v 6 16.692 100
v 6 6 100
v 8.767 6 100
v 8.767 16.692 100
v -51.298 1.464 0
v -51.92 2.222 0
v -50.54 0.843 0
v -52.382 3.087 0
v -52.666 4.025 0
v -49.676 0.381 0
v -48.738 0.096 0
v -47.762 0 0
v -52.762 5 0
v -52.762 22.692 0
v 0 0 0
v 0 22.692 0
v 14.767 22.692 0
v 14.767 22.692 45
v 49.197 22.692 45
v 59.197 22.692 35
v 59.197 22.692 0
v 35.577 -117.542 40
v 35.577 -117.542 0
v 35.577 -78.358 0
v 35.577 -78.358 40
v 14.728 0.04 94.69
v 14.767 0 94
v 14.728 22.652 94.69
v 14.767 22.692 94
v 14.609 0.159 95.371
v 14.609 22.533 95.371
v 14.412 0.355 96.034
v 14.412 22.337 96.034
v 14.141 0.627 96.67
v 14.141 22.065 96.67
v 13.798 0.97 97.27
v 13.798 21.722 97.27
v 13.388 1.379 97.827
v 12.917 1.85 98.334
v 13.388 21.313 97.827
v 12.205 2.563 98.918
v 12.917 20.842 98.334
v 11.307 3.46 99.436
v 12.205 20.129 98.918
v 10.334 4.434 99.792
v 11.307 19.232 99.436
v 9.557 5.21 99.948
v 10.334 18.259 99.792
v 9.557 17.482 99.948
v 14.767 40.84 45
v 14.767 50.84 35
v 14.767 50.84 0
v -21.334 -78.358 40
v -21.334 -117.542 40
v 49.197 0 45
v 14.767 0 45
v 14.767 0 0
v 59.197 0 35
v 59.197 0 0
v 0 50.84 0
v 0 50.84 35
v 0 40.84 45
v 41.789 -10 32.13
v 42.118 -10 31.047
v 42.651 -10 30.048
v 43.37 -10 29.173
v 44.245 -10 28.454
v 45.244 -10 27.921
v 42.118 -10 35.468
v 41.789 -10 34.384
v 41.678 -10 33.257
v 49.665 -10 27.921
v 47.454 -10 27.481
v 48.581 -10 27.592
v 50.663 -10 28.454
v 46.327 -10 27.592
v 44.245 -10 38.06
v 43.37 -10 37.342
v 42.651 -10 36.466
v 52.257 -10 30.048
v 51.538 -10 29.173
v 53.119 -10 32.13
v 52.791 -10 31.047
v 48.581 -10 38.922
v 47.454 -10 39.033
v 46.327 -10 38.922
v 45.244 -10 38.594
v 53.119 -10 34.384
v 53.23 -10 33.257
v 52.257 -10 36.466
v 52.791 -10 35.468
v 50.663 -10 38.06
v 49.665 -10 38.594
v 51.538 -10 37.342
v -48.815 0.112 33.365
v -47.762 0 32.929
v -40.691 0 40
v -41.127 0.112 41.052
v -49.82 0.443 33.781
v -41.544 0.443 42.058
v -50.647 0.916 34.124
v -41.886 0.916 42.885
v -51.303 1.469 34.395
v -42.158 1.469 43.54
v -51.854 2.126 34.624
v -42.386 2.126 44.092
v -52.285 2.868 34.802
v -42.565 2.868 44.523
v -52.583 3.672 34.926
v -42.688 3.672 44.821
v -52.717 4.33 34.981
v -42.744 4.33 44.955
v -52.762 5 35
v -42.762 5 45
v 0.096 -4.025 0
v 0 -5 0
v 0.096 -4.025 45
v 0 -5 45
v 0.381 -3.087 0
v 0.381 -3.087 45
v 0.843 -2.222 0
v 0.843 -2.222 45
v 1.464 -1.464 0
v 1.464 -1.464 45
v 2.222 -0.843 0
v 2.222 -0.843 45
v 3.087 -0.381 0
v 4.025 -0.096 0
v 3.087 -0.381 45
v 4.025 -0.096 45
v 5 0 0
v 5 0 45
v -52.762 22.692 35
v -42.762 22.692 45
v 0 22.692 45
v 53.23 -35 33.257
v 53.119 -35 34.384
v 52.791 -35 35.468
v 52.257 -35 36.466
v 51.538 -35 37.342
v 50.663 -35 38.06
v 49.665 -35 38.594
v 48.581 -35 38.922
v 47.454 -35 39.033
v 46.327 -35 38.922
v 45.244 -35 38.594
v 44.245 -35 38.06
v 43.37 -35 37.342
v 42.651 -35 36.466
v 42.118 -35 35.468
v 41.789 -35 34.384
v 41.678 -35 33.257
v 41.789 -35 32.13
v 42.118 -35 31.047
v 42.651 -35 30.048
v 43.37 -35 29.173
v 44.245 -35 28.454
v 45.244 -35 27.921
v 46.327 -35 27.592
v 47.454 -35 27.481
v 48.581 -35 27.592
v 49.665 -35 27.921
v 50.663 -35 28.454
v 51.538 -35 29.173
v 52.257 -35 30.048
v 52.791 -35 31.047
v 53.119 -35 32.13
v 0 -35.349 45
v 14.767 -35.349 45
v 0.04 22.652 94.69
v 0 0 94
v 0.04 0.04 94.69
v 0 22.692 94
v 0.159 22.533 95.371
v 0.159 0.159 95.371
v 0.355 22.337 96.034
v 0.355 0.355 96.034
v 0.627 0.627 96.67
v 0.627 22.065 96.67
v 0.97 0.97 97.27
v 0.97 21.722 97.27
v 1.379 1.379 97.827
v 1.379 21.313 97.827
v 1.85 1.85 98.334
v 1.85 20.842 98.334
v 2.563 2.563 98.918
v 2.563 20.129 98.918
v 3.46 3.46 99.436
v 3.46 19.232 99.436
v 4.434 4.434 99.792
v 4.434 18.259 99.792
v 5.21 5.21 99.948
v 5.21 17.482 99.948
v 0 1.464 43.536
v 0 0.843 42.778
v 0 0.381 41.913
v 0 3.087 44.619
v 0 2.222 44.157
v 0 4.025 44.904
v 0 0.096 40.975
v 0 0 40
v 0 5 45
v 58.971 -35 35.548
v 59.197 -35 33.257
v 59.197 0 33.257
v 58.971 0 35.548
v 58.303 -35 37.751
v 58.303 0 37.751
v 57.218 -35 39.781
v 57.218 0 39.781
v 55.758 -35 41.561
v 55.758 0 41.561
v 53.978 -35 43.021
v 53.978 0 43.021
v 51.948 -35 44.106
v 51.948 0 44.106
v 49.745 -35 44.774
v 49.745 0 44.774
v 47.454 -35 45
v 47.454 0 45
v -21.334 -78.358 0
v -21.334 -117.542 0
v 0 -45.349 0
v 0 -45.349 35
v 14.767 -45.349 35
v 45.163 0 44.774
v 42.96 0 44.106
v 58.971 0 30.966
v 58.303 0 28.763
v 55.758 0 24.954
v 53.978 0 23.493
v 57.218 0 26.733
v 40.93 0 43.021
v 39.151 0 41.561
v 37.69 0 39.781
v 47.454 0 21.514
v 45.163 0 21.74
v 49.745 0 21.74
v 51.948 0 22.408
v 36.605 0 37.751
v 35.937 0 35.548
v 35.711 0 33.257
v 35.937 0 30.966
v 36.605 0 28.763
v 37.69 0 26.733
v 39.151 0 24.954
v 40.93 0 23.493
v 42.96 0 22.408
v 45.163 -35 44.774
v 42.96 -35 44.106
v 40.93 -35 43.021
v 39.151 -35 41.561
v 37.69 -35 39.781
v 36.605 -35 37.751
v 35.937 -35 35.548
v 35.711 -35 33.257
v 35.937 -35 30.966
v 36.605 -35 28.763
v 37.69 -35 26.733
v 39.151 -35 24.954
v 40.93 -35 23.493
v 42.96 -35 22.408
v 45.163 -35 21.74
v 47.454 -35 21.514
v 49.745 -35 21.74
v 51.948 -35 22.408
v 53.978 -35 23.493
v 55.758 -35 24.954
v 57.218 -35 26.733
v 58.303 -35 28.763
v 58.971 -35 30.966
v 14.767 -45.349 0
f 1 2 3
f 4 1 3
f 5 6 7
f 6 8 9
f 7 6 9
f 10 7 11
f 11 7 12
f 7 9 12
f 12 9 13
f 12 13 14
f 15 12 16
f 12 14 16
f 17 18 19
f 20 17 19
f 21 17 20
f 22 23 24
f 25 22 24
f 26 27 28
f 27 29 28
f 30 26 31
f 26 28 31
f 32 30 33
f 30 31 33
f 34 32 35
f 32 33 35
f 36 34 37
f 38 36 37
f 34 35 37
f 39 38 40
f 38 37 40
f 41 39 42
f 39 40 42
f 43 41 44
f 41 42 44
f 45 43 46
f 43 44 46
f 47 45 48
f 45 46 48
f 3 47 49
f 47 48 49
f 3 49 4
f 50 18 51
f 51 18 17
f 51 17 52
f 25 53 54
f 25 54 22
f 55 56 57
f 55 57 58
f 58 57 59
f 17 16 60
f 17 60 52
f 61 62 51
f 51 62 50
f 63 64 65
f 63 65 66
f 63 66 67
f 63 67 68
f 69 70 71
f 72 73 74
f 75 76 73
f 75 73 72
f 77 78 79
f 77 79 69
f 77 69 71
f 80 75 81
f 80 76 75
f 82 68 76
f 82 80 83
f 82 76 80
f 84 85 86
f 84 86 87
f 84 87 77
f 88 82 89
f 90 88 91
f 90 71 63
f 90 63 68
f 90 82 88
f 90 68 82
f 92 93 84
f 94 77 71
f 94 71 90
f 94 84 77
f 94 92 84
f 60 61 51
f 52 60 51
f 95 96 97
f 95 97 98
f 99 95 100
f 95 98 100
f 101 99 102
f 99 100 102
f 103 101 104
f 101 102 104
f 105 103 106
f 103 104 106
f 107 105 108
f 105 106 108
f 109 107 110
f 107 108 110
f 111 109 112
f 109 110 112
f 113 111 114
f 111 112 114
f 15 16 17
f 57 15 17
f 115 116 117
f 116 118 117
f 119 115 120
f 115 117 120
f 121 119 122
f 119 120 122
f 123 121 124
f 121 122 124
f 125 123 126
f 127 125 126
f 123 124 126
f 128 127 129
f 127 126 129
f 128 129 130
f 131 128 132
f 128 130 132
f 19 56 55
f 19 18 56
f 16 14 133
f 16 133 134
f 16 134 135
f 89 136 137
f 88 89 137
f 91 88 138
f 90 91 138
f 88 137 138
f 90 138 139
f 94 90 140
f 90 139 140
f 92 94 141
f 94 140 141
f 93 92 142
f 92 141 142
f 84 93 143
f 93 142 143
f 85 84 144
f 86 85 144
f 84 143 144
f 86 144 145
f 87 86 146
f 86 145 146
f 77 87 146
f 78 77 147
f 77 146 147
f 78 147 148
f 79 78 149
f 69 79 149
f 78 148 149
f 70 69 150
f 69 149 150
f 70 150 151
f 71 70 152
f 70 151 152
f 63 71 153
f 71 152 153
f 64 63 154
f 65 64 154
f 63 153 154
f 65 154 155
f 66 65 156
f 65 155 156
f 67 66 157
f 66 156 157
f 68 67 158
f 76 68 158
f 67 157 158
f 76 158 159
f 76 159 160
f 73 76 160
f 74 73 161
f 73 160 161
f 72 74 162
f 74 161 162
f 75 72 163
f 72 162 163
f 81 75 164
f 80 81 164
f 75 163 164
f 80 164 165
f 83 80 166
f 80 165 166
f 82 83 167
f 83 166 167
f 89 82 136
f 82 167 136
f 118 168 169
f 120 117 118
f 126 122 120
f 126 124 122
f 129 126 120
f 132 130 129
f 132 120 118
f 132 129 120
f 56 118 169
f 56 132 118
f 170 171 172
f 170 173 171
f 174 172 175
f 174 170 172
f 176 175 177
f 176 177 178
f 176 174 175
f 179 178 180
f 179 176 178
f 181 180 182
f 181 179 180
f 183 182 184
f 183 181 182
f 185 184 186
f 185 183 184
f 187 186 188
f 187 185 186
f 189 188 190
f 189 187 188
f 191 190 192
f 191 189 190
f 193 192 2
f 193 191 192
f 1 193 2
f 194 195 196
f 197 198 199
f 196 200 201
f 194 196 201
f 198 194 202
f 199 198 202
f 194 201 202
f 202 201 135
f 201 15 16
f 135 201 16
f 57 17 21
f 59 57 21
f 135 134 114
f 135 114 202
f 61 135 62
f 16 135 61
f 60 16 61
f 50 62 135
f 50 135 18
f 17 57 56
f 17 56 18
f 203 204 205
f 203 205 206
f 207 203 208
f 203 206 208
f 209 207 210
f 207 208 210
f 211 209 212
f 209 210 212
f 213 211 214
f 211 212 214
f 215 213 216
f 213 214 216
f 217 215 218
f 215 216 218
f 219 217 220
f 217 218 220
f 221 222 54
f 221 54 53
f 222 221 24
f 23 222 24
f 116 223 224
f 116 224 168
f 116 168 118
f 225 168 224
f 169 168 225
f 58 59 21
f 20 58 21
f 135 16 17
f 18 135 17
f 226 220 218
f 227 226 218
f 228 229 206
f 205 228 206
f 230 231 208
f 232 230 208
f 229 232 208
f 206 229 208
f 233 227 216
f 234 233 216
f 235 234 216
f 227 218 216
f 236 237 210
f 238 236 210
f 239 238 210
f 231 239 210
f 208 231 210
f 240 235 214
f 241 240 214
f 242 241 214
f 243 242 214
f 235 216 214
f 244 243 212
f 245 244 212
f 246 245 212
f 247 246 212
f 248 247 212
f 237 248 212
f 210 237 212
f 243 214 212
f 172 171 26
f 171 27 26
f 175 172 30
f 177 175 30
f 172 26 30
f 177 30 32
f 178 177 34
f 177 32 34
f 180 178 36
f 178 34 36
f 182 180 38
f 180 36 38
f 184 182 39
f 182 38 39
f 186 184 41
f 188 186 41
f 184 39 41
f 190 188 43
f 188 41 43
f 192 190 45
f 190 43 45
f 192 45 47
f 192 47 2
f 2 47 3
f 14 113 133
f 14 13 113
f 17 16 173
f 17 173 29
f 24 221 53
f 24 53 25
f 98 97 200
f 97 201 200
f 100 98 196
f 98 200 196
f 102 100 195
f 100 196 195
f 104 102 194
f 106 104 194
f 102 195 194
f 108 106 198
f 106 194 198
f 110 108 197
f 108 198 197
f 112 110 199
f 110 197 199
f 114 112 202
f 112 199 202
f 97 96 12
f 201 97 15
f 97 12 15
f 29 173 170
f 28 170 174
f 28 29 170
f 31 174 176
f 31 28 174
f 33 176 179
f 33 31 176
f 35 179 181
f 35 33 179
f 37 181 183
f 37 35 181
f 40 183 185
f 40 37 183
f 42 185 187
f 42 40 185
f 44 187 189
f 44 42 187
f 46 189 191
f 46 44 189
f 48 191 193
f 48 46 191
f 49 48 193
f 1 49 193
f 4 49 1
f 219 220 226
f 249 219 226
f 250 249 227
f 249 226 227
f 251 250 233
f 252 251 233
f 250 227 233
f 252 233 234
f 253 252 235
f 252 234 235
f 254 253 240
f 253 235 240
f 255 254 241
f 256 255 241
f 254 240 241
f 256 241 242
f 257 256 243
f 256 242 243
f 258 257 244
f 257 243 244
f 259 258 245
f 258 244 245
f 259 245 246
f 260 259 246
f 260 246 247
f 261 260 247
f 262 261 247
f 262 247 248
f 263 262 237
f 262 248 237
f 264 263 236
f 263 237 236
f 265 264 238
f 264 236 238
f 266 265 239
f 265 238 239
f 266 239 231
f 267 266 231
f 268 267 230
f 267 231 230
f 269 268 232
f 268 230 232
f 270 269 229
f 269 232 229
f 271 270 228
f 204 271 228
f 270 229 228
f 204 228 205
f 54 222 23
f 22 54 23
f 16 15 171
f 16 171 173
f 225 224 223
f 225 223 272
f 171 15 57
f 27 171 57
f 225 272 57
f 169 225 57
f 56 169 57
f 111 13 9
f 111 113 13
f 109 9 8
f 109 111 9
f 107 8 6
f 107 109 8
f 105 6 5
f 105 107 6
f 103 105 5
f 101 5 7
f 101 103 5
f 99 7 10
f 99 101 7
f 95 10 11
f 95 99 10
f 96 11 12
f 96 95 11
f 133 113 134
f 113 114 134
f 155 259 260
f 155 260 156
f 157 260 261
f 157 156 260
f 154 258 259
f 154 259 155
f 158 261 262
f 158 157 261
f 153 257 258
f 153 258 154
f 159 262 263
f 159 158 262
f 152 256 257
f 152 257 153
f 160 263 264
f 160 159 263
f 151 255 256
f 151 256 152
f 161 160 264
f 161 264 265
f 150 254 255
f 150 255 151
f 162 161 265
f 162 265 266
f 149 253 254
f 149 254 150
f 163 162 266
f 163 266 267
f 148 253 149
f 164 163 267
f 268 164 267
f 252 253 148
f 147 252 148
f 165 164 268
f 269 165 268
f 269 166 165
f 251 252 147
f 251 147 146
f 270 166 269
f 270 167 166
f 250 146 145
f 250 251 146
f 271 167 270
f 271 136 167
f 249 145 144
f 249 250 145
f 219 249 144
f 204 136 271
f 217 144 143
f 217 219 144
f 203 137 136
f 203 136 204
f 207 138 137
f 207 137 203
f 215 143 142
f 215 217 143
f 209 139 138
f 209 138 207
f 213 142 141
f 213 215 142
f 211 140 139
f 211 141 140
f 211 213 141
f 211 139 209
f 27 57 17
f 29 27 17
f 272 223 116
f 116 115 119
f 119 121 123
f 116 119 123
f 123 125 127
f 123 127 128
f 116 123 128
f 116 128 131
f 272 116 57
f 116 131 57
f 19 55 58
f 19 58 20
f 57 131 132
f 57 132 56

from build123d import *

# Parameters (mm, degrees)
F0_W      = 52.7622997761
F0_H      = 22.692091763
F10_DEPTH = 45
F0_W_2    = 14.7673599422
F0_H_2    = 45.3494936228
F0_W_3    = 44.4295331836
F0_H_3    = 28.1479656696
F2_DEPTH  = 35
F3_SIZE   = 10
F3_2_SIZE = 10
F3_3_SIZE = 10
F3_4_SIZE = 10
F4_W      = 14.7673599422
F4_H      = 22.692091763
F5_DEPTH  = 100
F11_R     = 6
F6_R      = 5.776153979
F7_DEPTH  = 25
F12_R     = 5
F13_R     = 5
F8_W      = 56.9116361439
F8_H      = 39.1838252544
F9_DEPTH  = 40


with BuildPart() as f10:
    # F0 (on Top) → F10 (new body)
    with BuildSketch(Plane.XY):
        with Locations((-26.381149888, 11.3460458815)):
            Rectangle(F0_W, F0_H)
    extrude(amount=F10_DEPTH)

    # F3#4
    f3_4_edges = [f10.edges().sort_by_distance(p)[0] for p in [
        (-52.7623, 11.346046, 45),
    ]]
    chamfer(f3_4_edges, length=F3_4_SIZE)

    # F13
    f13_edges = [f10.edges().sort_by_distance(p)[0] for p in [
        (-47.7623, 0, 40),
        (-21.38115, 0, 45),
        (-52.7623, 0, 17.5),
    ]]
    fillet(f13_edges, radius=F13_R)


with BuildPart() as f10b:
    # F0 (on Top) → F10, piece 2 (new body)
    with BuildSketch(Plane.XY):
        with Locations((7.3836799711, -22.6747468114)):
            Rectangle(F0_W_2, F0_H_2)
    extrude(amount=F10_DEPTH)

    # F3
    f3_edges = [f10b.edges().sort_by_distance(p)[0] for p in [
        (7.38368, -45.349494, 45),
    ]]
    chamfer(f3_edges, length=F3_SIZE)

    # F12
    f12_edges = [f10b.edges().sort_by_distance(p)[0] for p in [
        (0, 0, 22.5),
    ]]
    fillet(f12_edges, radius=F12_R)


with BuildPart() as f10c:
    # F0 (on Top) → F10, piece 3 (new body)
    with BuildSketch(Plane.XY):
        with Locations((36.982126534, 11.3460458815)):
            Rectangle(F0_W_3, F0_H)
    extrude(amount=F10_DEPTH)

    # F3#3
    f3_3_edges = [f10c.edges().sort_by_distance(p)[0] for p in [
        (59.196893, 11.346046, 45),
    ]]
    chamfer(f3_3_edges, length=F3_3_SIZE)


with BuildPart() as f10d:
    # F0 (on Top) → F10, piece 4 (new body)
    with BuildSketch(Plane.XY):
        with Locations((7.3836799711, 36.7660745978)):
            Rectangle(F0_W_2, F0_H_3)
    extrude(amount=F10_DEPTH)

    # F3#2
    f3_2_edges = [f10d.edges().sort_by_distance(p)[0] for p in [
        (7.38368, 50.840057, 45),
    ]]
    chamfer(f3_2_edges, length=F3_2_SIZE)


with BuildPart() as f2:
    # F1 (on face) → F2 (new body)
    with BuildSketch(Plane.XZ):
        with BuildLine():
            ThreePointArc((47.4540758133, 45), (39.1506500614, 24.9537569356), (59.1968931258, 33.2571826875))
            ThreePointArc((59.1968931258, 33.2571826875), (55.7575015652, 41.5606084394), (47.4540758133, 45))
        make_face()
    extrude(amount=F2_DEPTH)

    # F6 (on face) → F7 (cut)
    with BuildSketch(Plane.XZ.offset(35)):
        with Locations((47.4540758133, 33.2571826875)):
            Circle(F6_R)
    extrude(amount=-F7_DEPTH, mode=Mode.SUBTRACT)


with BuildPart() as f5:
    # F4 (on face) → F5 (new body)
    with BuildSketch(Plane.XY):
        with Locations((7.3836799711, 11.3460458815)):
            Rectangle(F4_W, F4_H)
    extrude(amount=F5_DEPTH)

    # F11
    f11_edges = [f5.edges().sort_by_distance(p)[0] for p in [
        (7.38368, 0, 100),
        (14.76736, 11.346046, 100),
        (7.38368, 22.692092, 100),
        (0, 11.346046, 100),
    ]]
    fillet(f11_edges, radius=F11_R)


with BuildPart() as f9:
    # F8 (on Top) → F9 (new body)
    with BuildSketch(Plane.XY):
        with Locations((7.1215014905, -97.9501754045)):
            Rectangle(F8_W, F8_H)
    extrude(amount=F9_DEPTH)


solid = Compound([f10.part, f10b.part, f10c.part, f10d.part, f2.part, f5.part, f9.part])
